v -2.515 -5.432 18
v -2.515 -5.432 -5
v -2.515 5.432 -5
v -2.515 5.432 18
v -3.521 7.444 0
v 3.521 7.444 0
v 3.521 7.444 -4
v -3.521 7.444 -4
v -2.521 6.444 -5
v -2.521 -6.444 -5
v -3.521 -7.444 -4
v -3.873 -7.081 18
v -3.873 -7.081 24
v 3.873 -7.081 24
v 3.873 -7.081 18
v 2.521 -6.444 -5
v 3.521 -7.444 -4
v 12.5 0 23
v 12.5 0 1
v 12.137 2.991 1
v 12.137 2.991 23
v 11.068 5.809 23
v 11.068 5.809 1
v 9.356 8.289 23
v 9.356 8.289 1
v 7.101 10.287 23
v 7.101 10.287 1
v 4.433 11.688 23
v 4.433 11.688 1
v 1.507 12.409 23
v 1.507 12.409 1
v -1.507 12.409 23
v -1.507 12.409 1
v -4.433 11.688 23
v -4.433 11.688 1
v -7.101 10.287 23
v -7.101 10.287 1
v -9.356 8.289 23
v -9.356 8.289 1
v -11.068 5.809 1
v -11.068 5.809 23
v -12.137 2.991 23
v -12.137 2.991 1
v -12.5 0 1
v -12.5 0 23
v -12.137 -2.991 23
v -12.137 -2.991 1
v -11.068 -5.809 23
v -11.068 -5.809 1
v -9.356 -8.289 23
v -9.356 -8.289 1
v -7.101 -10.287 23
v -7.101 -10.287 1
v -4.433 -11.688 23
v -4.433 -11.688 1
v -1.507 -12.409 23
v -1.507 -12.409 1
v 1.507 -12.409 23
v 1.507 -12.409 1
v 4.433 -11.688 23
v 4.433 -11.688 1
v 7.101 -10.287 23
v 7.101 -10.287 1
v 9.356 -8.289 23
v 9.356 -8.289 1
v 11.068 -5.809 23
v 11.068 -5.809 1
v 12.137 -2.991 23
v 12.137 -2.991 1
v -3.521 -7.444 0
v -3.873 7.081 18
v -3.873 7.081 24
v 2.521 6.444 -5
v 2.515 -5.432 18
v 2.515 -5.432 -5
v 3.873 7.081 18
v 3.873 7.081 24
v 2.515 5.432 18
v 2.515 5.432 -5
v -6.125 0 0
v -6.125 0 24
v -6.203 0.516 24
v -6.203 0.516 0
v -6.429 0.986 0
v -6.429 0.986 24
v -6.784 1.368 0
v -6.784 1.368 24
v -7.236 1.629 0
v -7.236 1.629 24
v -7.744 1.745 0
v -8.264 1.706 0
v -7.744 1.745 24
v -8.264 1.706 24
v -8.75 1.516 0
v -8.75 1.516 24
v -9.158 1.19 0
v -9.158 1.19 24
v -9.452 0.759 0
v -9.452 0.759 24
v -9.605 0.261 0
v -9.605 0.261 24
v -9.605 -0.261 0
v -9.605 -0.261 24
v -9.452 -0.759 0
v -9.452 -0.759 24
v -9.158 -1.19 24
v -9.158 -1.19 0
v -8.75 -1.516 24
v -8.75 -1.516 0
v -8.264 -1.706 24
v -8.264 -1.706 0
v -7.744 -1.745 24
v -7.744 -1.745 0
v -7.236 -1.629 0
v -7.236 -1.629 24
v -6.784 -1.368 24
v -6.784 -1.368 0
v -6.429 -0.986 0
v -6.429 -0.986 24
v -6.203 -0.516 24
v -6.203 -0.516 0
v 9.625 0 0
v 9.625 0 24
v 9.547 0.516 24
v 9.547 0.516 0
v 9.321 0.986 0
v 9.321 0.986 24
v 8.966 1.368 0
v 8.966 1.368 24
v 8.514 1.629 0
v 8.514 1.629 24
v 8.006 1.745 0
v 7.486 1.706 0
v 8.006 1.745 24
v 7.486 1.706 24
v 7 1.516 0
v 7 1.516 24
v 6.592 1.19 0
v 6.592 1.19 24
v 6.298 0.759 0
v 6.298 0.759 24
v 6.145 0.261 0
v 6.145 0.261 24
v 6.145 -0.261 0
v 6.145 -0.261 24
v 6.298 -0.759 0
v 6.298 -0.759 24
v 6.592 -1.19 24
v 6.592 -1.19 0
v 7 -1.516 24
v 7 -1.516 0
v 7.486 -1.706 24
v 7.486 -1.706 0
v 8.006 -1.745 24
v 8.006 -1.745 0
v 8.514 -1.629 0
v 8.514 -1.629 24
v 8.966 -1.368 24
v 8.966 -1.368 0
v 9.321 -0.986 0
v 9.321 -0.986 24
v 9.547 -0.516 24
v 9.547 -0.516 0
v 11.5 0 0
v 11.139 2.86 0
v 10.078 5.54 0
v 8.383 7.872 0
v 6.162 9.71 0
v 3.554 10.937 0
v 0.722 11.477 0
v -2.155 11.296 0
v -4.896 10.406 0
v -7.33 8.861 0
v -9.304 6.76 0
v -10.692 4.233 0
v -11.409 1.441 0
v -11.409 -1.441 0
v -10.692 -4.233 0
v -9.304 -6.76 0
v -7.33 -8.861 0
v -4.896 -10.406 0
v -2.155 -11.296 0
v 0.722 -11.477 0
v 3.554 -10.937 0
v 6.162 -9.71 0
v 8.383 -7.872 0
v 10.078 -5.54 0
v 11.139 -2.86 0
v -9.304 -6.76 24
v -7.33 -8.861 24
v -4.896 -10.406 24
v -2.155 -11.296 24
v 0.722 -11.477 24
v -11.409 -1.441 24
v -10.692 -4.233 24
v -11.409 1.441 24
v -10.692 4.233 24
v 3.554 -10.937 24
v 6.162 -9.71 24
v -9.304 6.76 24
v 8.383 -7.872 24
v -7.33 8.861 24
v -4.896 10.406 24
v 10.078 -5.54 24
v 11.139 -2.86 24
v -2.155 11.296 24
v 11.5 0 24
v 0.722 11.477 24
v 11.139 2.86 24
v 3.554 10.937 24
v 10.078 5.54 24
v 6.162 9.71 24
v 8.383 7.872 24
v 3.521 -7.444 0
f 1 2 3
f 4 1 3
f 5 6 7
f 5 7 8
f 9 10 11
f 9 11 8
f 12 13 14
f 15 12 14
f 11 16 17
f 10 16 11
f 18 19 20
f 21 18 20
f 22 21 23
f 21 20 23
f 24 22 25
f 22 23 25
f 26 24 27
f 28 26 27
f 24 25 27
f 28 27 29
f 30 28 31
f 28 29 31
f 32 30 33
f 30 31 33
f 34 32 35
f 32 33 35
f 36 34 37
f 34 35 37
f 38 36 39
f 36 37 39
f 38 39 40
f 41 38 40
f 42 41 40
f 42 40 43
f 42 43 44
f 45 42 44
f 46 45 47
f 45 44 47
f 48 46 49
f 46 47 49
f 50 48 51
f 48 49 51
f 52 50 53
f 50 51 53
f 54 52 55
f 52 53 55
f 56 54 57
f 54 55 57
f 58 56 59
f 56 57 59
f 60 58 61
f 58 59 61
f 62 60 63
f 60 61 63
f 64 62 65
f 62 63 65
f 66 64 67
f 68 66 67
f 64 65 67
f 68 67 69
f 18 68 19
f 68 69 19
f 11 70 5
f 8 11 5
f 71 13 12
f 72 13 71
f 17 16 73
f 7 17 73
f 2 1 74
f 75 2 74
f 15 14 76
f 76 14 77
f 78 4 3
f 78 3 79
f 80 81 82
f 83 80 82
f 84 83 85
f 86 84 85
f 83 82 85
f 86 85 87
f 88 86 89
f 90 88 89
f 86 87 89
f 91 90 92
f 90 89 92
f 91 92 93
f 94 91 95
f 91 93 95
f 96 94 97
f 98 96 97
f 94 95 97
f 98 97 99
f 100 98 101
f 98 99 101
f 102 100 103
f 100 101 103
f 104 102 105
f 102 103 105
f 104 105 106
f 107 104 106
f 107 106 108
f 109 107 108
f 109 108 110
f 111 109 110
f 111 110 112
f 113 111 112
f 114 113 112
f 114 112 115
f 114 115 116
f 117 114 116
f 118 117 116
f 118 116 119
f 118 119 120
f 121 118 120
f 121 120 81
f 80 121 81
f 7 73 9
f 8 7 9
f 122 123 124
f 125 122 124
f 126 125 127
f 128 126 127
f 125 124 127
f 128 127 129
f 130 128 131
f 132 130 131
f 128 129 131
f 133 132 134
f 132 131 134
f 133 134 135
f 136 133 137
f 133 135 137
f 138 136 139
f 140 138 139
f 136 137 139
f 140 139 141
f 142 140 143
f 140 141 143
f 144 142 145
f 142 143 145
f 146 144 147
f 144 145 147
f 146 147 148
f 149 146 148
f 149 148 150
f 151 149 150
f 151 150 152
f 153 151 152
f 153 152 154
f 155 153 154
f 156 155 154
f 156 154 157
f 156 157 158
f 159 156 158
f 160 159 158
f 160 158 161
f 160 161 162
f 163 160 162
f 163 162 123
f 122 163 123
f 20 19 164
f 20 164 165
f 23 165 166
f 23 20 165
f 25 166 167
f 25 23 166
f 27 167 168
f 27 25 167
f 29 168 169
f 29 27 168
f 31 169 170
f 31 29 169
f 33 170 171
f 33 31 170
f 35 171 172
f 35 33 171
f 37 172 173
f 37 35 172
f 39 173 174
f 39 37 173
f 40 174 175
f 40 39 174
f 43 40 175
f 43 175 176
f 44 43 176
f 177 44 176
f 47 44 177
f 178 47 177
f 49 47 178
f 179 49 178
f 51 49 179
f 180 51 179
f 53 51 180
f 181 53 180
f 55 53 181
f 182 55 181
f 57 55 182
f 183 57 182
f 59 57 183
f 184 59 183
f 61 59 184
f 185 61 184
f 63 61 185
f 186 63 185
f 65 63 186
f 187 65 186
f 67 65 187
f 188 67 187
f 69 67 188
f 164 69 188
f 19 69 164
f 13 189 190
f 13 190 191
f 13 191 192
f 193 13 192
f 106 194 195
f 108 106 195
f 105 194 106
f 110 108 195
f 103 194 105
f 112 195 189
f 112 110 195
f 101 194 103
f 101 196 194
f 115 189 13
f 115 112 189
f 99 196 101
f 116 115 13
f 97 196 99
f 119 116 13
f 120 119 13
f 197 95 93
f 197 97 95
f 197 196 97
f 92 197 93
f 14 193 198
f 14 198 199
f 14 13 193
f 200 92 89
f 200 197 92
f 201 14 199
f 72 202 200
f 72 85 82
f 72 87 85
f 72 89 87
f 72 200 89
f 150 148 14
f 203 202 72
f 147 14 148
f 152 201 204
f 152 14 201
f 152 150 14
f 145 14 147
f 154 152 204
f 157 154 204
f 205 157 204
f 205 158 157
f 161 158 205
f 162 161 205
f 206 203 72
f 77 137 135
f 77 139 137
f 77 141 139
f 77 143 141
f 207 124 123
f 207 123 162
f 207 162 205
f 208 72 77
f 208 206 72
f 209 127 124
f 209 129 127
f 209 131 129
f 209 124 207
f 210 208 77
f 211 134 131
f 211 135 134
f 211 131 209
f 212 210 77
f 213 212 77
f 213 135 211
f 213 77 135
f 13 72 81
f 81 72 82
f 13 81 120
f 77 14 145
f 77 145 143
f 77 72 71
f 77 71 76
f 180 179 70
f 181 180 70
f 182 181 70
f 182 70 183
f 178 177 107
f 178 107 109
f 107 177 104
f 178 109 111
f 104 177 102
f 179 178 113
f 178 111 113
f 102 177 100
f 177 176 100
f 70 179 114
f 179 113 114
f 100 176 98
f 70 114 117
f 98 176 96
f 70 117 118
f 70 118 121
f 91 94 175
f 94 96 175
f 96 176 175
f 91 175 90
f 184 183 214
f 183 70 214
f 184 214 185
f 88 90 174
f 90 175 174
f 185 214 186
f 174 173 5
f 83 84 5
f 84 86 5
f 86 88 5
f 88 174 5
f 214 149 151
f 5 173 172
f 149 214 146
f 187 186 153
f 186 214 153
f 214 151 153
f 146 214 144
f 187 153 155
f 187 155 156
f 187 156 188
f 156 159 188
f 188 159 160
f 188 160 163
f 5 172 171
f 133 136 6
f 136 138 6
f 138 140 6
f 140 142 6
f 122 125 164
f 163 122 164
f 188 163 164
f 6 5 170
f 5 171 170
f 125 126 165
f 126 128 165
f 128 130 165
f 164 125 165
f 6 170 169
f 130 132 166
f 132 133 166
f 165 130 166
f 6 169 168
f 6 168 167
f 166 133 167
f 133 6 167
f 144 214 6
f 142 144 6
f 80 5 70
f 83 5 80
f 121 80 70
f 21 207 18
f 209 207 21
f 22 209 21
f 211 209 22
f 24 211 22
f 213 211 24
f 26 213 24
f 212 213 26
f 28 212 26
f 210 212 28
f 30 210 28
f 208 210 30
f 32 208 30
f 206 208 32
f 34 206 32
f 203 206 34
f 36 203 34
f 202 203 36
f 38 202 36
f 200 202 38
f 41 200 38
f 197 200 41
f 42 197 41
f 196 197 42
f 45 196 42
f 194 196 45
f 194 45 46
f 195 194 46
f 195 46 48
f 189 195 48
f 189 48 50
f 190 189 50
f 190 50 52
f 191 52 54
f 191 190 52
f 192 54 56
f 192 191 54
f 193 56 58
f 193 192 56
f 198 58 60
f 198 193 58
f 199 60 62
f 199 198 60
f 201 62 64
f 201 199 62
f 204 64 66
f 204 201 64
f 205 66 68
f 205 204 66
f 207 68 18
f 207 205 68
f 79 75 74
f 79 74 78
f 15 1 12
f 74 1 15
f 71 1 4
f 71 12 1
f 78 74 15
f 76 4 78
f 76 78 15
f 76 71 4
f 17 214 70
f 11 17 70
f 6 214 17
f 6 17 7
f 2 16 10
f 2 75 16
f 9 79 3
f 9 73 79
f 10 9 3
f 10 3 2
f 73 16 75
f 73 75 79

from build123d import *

# Parameters (mm, degrees)
CROQUIS1_R              = 12.5
SALIENTE_EXTRUIR1_DEPTH = 24
CROQUIS2_W              = 7.746059902
CROQUIS2_H              = 14.16230267
CORTAR_EXTRUIR1_DEPTH   = 6
CROQUIS3_W              = 7.04155471
CROQUIS3_H              = 14.887858528
SALIENTE_EXTRUIR2_DEPTH = 5
CHAFL_N1_SIZE           = 1
CHAFL_N2_SIZE           = 1
CROQUIS4_R              = 1.75
CORTAR_EXTRUIR2_DEPTH   = 34.963215395
CHAFL_N3_SIZE           = 1
CROQUIS5_W              = 5.029681936
CROQUIS5_H              = 10.86411298
CORTAR_EXTRUIR3_DEPTH   = 30.008619409


with BuildPart() as part:
    # Croquis1 → Saliente-Extruir1 (new body)
    with BuildSketch(Plane.XY):
        Circle(CROQUIS1_R)
    extrude(amount=SALIENTE_EXTRUIR1_DEPTH)

    # Croquis2 → Cortar-Extruir1 (cut)
    with BuildSketch(Plane.XY.offset(24)):
        Rectangle(CROQUIS2_W, CROQUIS2_H)
    extrude(amount=-CORTAR_EXTRUIR1_DEPTH, mode=Mode.SUBTRACT)

    # Croquis3 → Saliente-Extruir2 (add)
    with BuildSketch(Plane(origin=(0, 0, 0), x_dir=(-1, 0, 0), z_dir=(0, 0, -1))):
        Rectangle(CROQUIS3_W, CROQUIS3_H)
    extrude(amount=SALIENTE_EXTRUIR2_DEPTH)

    # Chaflán1
    chafl_n1_edges = [part.edges().sort_by_distance(p)[0] for p in [
        (-3.520777355, 0, -5),
        (0, 7.443929264, -5),
        (3.520777355, 0, -5),
        (0, -7.443929264, -5),
    ]]
    chamfer(chafl_n1_edges, length=CHAFL_N1_SIZE)

    # Chaflán2
    chafl_n2_edges = [part.edges().sort_by_distance(p)[0] for p in [
        (-12.5, 0, 0),
    ]]
    chamfer(chafl_n2_edges, length=CHAFL_N2_SIZE)

    # Croquis4 → Cortar-Extruir2 (cut, through all)
    with BuildSketch(Plane.XY.offset(24)):
        with Locations((-7.875, 0)):
            Circle(CROQUIS4_R)
        with Locations((7.875, 0)):
            Circle(CROQUIS4_R)
    extrude(amount=-CORTAR_EXTRUIR2_DEPTH, mode=Mode.SUBTRACT)

    # Chaflán3
    chafl_n3_edges = [part.edges().sort_by_distance(p)[0] for p in [
        (-12.5, 0, 24),
    ]]
    chamfer(chafl_n3_edges, length=CHAFL_N3_SIZE)

    # Croquis5 → Cortar-Extruir3 (cut, through all)
    with BuildSketch(Plane.XY.offset(18)):
        Rectangle(CROQUIS5_W, CROQUIS5_H)
    extrude(amount=-CORTAR_EXTRUIR3_DEPTH, mode=Mode.SUBTRACT)


solid = part.part
